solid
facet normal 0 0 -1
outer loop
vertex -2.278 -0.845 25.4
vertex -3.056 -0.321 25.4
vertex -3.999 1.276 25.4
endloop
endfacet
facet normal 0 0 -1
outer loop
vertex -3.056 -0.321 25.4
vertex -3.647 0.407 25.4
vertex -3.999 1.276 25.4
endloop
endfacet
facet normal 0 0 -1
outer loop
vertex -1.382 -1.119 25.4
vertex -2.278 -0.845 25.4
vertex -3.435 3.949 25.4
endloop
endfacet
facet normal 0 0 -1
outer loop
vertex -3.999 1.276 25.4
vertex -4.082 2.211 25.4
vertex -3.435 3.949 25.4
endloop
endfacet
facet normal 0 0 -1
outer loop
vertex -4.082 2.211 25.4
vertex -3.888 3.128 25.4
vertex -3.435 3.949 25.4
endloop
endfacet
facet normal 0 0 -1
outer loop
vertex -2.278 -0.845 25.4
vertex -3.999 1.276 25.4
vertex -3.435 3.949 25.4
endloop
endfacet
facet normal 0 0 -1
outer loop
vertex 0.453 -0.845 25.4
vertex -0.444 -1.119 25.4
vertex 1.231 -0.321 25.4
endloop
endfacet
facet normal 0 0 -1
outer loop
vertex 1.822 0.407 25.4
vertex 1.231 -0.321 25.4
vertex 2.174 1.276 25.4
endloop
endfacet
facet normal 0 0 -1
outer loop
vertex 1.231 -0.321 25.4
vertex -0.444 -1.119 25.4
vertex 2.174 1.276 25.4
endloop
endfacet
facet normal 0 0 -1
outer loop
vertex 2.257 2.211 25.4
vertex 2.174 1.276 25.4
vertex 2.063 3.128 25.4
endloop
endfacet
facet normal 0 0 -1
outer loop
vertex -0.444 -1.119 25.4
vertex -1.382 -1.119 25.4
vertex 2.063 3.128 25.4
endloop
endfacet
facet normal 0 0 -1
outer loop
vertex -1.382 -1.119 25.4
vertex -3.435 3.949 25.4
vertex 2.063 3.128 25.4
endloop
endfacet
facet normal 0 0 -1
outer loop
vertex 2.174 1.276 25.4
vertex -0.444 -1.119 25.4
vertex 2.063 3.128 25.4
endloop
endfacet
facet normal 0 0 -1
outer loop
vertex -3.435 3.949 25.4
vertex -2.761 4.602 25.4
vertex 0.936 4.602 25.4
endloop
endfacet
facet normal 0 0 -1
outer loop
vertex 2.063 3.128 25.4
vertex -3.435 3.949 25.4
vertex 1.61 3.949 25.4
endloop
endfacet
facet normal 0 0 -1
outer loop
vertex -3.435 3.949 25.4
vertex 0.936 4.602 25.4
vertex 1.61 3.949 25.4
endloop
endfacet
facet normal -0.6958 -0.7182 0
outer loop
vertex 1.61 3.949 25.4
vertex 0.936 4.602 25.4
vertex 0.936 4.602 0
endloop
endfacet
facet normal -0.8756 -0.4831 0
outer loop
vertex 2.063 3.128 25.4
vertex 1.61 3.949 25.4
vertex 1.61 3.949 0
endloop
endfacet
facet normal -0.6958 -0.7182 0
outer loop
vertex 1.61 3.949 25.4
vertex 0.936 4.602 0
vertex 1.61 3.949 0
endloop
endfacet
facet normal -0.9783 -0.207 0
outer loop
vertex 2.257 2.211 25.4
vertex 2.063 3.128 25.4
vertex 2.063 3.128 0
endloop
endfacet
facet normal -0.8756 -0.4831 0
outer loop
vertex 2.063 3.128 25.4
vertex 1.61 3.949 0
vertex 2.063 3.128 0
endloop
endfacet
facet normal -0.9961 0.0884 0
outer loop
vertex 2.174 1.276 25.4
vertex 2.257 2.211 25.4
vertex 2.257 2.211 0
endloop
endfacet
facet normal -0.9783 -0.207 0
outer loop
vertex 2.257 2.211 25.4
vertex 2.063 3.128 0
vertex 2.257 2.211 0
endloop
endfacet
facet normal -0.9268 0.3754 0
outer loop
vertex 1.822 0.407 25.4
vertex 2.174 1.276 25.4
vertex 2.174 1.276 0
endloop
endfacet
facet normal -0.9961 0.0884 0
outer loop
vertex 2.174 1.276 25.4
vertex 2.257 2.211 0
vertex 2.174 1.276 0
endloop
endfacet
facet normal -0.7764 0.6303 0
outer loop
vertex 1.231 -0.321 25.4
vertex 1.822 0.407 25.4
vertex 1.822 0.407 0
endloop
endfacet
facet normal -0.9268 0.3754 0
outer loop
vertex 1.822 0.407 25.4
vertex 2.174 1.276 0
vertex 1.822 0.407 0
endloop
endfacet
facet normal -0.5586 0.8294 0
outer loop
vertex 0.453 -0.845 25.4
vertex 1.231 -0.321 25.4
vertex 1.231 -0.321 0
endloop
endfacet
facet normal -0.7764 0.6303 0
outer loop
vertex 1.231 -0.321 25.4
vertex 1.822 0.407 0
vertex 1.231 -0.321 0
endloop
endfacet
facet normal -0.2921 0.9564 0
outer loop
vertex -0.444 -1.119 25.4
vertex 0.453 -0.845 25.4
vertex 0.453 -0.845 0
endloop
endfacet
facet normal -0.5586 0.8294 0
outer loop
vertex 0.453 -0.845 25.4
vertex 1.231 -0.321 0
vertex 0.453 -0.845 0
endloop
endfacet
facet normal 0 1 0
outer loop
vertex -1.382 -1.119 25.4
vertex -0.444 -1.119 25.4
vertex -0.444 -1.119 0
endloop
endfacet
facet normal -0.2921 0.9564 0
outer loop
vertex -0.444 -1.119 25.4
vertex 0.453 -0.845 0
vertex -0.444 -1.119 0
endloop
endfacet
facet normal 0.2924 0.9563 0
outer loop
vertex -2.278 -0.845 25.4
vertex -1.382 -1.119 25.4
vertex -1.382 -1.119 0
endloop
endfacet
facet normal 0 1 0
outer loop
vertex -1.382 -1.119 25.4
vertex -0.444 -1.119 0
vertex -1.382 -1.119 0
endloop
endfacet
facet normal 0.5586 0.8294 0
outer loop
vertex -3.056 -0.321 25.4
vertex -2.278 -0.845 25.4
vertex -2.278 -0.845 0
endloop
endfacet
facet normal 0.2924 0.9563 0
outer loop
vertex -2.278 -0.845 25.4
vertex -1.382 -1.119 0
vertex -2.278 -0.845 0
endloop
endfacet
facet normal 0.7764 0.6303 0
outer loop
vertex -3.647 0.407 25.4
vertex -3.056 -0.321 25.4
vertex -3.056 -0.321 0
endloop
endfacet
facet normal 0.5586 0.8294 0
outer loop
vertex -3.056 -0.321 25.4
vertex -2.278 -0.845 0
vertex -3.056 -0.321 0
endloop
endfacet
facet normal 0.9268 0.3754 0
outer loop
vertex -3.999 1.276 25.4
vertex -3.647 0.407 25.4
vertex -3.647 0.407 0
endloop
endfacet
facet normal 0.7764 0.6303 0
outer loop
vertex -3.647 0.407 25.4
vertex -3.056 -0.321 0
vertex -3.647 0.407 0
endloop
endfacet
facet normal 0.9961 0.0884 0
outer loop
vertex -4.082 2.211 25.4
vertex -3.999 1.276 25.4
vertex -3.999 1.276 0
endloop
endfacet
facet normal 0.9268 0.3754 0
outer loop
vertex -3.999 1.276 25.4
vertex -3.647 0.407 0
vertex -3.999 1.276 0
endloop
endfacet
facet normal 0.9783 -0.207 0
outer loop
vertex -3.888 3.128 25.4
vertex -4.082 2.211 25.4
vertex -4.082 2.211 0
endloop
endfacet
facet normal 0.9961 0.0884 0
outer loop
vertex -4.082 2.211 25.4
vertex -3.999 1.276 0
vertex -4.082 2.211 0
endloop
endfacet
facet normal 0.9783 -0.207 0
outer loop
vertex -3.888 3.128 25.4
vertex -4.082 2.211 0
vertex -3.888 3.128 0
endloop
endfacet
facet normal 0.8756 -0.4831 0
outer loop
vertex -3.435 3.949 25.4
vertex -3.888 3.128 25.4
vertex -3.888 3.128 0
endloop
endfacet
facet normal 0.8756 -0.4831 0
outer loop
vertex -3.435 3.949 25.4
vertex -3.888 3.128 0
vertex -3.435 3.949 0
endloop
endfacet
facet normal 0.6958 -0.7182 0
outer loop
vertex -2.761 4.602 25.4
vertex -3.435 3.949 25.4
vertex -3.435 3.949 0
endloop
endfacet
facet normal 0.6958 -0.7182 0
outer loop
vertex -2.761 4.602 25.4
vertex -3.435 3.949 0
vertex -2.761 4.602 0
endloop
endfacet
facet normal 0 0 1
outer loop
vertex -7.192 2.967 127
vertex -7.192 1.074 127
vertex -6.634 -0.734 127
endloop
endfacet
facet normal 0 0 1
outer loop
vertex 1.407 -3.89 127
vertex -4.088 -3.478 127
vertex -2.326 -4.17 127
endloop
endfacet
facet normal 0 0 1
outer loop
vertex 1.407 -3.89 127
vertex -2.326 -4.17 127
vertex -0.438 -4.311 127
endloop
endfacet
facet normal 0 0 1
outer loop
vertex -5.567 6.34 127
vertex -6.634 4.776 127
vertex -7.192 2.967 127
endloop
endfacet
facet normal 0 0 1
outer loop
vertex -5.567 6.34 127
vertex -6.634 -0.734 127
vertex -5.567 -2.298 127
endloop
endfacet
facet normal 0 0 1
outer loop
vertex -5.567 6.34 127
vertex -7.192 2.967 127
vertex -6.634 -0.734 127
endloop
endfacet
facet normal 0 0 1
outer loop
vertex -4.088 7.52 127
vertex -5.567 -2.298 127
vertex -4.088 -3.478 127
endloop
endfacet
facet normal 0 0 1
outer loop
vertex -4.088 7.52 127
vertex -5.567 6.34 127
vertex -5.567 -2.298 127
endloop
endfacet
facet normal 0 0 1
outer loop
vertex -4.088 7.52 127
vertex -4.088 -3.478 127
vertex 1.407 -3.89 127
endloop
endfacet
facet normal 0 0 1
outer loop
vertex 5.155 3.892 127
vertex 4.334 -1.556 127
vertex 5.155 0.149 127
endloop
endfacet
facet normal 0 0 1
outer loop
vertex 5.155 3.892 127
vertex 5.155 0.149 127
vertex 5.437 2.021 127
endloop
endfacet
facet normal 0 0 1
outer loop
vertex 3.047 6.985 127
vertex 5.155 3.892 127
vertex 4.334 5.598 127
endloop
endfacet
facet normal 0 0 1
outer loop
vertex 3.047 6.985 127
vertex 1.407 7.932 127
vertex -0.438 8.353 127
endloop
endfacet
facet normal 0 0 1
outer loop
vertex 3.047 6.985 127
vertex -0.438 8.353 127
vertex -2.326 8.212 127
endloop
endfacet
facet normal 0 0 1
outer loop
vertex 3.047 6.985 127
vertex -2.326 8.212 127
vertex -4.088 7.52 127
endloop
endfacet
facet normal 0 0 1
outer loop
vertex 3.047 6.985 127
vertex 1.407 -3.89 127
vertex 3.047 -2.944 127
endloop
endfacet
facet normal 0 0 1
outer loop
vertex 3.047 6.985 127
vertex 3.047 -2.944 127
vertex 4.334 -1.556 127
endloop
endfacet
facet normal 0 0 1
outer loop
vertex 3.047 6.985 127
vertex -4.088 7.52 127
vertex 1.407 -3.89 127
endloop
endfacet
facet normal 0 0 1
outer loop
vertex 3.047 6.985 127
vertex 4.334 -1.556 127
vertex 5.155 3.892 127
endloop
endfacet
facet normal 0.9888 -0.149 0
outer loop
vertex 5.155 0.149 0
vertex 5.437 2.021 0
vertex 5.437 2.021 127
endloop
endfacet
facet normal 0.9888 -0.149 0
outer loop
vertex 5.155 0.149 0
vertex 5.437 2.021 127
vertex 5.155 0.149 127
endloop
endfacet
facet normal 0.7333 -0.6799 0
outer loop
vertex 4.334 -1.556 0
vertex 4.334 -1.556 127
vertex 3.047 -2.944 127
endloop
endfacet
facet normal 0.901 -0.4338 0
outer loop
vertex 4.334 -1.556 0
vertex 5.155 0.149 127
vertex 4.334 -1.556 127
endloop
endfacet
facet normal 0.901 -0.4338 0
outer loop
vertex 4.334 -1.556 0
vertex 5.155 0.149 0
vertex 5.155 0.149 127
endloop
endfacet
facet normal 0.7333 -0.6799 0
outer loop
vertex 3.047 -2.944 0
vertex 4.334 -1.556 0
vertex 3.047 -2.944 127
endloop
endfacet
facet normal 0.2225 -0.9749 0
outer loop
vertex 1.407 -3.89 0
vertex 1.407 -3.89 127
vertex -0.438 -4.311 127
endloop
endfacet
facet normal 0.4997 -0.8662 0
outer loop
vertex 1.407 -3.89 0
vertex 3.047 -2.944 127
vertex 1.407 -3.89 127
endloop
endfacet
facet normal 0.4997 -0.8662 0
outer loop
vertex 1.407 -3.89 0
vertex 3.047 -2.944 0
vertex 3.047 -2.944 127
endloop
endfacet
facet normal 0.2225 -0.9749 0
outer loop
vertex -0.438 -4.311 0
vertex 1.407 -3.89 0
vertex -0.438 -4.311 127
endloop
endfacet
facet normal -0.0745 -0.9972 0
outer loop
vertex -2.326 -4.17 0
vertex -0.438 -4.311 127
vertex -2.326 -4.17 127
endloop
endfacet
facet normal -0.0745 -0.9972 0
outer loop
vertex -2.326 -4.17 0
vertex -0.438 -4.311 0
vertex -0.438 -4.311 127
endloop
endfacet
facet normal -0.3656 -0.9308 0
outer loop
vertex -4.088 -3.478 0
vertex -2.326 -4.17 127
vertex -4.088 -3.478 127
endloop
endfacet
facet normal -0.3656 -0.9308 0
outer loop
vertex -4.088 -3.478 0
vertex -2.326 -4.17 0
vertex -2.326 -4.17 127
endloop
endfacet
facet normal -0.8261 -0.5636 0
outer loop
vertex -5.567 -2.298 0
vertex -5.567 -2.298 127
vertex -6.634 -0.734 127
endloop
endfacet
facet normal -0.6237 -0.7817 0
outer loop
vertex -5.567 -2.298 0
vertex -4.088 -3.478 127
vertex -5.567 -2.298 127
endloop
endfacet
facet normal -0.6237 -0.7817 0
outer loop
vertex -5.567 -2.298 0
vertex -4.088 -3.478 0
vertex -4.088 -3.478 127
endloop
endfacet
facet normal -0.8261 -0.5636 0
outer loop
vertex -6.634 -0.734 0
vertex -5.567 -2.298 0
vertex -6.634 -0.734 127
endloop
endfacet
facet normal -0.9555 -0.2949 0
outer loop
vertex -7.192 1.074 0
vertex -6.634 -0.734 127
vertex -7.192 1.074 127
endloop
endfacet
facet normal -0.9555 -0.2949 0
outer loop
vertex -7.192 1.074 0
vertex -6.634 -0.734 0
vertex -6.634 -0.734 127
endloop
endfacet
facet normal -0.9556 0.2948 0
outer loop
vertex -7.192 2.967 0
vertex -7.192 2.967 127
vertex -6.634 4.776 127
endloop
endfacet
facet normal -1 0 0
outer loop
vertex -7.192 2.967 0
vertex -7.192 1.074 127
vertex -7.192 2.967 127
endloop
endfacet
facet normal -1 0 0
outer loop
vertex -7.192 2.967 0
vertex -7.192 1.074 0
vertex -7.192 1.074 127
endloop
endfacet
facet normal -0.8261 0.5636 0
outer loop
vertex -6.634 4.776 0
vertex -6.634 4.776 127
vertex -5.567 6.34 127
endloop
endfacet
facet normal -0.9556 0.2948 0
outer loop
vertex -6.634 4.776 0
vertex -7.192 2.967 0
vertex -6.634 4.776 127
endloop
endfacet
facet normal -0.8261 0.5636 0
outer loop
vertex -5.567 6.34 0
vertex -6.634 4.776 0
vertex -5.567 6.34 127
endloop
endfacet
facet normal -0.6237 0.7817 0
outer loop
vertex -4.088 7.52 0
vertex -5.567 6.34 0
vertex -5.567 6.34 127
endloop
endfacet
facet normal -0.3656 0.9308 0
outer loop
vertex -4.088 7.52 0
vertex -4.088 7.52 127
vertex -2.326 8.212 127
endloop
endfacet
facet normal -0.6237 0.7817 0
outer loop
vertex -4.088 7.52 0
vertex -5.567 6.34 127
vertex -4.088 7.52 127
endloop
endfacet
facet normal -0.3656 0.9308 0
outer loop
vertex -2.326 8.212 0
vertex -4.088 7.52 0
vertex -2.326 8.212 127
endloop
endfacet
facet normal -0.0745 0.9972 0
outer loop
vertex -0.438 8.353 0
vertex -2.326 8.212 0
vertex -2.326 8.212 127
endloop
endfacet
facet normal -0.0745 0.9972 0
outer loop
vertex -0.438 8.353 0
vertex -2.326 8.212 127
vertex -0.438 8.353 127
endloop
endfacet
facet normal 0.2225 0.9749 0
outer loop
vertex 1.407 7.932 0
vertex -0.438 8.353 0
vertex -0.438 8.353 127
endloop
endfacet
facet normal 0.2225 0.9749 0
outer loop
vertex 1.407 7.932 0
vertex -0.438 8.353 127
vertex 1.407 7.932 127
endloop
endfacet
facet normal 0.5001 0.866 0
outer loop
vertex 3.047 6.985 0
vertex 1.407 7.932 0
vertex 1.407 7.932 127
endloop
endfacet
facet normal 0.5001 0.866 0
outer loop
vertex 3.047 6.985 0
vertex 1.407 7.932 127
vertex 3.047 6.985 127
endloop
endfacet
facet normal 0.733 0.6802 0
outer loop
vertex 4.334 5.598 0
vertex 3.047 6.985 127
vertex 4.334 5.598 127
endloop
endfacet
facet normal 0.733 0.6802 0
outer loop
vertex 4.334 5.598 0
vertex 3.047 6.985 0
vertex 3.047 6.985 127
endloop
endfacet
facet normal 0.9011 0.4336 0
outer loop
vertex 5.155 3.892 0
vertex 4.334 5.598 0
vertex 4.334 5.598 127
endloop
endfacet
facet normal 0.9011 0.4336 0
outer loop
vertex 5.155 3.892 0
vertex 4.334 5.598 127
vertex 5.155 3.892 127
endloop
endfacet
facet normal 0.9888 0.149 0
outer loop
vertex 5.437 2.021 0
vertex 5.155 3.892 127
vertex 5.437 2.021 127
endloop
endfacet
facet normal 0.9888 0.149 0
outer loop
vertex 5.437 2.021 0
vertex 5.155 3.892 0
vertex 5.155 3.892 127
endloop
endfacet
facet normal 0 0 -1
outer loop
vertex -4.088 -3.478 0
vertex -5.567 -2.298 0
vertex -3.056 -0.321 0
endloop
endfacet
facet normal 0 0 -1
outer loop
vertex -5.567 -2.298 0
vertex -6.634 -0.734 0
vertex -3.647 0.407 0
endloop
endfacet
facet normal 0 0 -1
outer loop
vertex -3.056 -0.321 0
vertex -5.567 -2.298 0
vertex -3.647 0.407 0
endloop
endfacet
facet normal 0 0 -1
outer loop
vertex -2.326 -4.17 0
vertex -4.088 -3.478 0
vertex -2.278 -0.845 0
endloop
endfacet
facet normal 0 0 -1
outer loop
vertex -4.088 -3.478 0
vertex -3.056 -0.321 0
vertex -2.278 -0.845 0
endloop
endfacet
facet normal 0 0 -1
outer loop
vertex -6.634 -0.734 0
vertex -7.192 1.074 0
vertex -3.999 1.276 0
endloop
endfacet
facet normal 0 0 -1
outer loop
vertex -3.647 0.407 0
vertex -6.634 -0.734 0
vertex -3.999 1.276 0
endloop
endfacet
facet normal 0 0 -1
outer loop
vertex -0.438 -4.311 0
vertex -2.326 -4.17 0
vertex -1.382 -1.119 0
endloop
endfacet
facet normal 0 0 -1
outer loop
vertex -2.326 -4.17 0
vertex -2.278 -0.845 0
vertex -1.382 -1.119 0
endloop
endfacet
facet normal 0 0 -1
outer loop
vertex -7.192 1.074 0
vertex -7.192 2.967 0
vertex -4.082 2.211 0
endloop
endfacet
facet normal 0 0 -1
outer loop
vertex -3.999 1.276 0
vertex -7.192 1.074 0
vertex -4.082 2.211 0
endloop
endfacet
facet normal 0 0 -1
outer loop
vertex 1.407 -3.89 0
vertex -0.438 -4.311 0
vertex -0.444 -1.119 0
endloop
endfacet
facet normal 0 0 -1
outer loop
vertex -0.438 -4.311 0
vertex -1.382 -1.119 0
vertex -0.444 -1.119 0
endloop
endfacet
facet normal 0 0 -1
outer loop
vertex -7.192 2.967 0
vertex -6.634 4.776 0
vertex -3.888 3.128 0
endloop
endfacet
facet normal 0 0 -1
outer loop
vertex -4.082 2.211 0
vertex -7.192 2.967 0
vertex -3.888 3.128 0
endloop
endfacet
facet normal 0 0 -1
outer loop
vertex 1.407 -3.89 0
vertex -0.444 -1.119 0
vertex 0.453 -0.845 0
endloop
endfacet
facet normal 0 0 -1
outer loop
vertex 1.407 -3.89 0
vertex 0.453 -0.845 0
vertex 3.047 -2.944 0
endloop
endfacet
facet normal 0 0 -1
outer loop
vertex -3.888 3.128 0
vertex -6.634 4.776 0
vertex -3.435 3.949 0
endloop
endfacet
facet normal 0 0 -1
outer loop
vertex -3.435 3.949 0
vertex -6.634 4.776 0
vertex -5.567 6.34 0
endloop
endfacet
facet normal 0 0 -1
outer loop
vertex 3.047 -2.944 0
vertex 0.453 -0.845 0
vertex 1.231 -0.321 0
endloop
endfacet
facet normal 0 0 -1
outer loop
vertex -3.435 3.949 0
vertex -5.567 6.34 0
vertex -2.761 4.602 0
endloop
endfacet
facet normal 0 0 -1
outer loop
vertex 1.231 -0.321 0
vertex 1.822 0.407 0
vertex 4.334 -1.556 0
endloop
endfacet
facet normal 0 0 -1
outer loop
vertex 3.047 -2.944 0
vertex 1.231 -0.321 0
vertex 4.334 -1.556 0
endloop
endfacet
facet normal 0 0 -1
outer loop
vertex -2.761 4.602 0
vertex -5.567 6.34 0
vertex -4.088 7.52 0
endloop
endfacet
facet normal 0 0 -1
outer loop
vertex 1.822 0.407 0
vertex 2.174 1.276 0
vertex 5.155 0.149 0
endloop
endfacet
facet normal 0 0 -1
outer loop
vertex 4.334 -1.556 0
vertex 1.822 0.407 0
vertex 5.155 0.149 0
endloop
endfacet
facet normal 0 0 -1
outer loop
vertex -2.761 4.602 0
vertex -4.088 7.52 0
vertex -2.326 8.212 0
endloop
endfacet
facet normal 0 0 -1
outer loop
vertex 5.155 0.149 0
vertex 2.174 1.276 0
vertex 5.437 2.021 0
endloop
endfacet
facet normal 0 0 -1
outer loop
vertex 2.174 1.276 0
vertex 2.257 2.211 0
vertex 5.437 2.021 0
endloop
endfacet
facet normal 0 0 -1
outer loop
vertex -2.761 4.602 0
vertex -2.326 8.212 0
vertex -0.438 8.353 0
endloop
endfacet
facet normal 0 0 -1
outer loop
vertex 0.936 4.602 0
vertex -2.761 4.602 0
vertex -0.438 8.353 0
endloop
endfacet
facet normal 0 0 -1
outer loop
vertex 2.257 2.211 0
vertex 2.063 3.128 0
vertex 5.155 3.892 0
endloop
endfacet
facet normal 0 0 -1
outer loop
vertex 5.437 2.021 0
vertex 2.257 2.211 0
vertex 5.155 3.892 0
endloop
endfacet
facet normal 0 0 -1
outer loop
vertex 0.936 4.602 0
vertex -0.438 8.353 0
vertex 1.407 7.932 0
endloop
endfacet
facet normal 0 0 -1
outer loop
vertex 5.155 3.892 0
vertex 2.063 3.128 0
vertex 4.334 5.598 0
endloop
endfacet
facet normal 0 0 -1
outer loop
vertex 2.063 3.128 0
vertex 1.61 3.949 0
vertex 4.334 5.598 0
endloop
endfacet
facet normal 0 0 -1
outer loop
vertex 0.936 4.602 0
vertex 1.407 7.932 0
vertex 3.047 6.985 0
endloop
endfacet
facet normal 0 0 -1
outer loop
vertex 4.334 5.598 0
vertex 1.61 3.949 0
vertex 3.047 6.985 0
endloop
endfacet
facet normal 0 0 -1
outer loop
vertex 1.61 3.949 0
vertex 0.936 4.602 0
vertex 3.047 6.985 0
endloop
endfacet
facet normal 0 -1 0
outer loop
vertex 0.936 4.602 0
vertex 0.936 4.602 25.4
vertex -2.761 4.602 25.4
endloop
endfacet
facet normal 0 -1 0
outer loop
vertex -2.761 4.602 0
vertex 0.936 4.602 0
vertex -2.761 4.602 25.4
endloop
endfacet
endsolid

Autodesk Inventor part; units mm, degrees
ref_plane "YZ Plane" through (0, 0, 0) normal (1, 0, 0) x (0, 1, 0)
ref_plane "XZ Plane" through (0, 0, 0) normal (0, 1, 0) x (-1, 0, 0)
ref_plane "XY Plane" through (0, 0, 0) normal (0, 0, 1) x (1, 0, 0)
sketch "Sketch1" plane through (0, 0, 0) normal (0, 0, 1) x (1, 0, 0)
  circle A0 centre (-0.9126, 2.0208) radius 3.175
  circle A1 centre (-0.9126, 2.0208) radius 6.35
  point P0 (0, 0)
  dimension "d0" = 6.35
  dimension "d1" = 12.7
extrude "Extrusion1" add sketch "Sketch1" along normal blind 25.4
sketch "Sketch2" plane through (-0.9126, 2.0208, 25.4) normal (0, 0, 1) x (1, 0, 0)
  line L0 (-3.2261, 4.7402) -> (3.0392, 4.7402)
  line L1 (3.0392, 4.7402) -> (3.0392, 2.5812)
  line L2 (3.0392, 2.5812) -> (-3.2261, 2.5812)
  line L3 (-3.2261, 2.5812) -> (-3.2261, 4.7402)
  point P0 (0.9126, -2.0208)
  dimension "d6" = 2.159
extrude "Extrusion2" add sketch "Sketch2" against normal blind 25.4
sketch "Sketch3" plane through (-0.9126, 2.0208, 25.4) normal (0, 0, 1) x (1, 0, 0)
  circle A0 centre (0, 0) radius 6.35
  point P0 (0.9126, -2.0208)
extrude "Extrusion3" add sketch "Sketch3" along normal blind 101.6
properties part number "motoradaptor"
